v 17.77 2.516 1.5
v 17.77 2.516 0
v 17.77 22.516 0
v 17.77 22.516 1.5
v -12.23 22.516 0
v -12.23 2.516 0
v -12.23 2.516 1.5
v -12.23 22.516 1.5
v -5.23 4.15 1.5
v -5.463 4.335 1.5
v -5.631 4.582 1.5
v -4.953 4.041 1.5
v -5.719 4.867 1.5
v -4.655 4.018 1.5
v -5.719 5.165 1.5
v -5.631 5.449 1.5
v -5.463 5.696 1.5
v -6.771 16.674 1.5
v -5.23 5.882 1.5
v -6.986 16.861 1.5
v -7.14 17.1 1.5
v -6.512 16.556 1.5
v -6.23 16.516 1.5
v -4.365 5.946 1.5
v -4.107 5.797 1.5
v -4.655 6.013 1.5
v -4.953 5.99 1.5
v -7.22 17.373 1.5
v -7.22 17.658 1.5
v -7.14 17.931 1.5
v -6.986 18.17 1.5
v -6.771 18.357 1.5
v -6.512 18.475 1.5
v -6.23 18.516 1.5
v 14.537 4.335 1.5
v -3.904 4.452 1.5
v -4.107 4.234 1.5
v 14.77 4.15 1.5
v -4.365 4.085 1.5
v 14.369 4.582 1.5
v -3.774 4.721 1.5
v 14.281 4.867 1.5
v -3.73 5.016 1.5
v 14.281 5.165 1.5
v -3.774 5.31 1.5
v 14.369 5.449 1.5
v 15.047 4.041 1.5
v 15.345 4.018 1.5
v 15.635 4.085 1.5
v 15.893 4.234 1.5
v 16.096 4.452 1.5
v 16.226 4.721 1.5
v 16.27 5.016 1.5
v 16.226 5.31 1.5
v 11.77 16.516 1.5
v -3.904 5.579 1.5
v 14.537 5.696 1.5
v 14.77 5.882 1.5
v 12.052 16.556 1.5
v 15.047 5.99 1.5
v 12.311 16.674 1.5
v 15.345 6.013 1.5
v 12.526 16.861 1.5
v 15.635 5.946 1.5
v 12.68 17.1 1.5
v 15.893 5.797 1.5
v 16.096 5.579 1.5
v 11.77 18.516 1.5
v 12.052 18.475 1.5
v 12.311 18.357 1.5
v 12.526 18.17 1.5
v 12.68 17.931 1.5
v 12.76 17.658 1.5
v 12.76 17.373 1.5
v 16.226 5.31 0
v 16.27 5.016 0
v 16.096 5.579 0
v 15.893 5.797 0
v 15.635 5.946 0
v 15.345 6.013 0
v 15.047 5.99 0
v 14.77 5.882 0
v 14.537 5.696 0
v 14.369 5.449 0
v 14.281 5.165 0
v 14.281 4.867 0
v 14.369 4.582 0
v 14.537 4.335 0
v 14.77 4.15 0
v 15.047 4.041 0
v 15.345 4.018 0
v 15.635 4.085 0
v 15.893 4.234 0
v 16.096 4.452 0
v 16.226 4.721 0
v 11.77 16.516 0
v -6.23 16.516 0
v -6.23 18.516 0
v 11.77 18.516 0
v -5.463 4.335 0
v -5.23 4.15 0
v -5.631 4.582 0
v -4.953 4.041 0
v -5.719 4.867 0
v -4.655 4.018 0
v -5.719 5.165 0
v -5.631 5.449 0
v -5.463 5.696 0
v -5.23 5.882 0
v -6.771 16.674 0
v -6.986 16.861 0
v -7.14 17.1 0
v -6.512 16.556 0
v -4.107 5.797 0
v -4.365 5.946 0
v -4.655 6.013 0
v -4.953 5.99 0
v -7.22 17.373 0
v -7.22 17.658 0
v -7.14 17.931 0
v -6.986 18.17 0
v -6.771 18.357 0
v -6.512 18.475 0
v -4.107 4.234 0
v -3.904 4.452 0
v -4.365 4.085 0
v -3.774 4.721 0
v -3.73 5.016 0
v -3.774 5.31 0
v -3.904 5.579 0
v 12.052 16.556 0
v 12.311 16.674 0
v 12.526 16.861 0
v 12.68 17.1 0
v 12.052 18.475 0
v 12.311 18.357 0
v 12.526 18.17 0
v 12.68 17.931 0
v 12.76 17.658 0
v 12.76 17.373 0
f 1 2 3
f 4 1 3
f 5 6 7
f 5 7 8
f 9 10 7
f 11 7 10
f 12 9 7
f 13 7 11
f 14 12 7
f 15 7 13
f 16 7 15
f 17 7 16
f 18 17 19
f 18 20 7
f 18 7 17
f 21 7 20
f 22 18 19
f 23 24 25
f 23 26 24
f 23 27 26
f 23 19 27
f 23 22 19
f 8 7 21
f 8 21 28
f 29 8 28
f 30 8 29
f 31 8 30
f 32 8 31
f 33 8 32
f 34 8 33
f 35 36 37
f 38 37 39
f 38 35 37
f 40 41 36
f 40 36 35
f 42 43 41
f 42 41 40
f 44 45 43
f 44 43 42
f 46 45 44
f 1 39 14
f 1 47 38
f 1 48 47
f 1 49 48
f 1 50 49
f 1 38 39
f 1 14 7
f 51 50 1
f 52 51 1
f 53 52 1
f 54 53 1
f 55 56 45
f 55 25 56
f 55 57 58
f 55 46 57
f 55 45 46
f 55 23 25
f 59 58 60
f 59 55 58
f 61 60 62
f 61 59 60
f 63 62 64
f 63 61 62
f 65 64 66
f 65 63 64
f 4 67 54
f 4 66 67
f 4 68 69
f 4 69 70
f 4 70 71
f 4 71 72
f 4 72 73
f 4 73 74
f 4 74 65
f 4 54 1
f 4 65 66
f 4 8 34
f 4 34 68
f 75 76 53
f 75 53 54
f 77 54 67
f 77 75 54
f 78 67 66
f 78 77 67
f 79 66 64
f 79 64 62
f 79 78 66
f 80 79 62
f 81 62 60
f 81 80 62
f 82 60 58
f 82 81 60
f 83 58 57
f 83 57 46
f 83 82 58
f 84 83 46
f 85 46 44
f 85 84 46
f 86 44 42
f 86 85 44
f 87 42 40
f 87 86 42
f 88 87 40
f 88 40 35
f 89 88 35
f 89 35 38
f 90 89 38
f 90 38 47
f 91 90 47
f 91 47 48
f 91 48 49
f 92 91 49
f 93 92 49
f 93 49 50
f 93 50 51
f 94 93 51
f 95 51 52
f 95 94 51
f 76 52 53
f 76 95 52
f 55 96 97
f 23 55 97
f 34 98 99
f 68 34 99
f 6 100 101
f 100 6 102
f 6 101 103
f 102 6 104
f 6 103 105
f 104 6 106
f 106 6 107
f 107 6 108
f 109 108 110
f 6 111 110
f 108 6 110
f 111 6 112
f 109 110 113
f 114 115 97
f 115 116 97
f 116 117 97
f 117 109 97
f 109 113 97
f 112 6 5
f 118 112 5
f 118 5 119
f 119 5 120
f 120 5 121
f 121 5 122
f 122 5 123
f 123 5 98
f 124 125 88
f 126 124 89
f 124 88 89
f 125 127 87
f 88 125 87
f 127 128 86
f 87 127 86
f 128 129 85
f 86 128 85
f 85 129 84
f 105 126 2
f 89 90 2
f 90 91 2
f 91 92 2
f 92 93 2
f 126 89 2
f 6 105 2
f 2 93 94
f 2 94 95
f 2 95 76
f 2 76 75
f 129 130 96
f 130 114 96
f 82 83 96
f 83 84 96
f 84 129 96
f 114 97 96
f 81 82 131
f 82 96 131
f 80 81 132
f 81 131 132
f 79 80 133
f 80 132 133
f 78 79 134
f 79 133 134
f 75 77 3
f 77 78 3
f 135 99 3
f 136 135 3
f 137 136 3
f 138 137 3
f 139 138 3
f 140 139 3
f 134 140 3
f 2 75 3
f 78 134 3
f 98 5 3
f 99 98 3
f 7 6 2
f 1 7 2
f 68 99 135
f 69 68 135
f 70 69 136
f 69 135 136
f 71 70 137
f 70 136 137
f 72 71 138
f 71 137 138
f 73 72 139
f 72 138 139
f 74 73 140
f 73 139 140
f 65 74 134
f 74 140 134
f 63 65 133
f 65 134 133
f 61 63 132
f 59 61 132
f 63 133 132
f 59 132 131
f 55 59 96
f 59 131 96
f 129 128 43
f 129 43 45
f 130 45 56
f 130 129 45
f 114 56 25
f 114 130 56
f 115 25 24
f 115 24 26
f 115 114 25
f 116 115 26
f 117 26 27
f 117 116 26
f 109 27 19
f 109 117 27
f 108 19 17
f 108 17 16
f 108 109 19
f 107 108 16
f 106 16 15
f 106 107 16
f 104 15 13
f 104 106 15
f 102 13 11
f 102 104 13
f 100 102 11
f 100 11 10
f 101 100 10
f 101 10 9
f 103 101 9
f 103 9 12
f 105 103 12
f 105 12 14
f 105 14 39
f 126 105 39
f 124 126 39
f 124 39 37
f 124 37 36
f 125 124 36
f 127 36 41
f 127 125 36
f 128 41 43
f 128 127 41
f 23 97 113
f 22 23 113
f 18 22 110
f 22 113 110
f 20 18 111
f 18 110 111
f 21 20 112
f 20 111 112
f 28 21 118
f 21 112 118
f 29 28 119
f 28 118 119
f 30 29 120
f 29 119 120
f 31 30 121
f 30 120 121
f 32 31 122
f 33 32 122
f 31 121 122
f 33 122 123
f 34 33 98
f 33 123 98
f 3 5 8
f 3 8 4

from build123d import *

# Parameters (mm, degrees)
SKETCH4_W           = 30
SKETCH4_H           = 20
SKETCH4_R           = 1
BOSS_EXTRUDE2_DEPTH = 1.5


with BuildPart() as part:
    # Sketch4 → Boss-Extrude2 (new body)
    with BuildSketch(Plane.XY):
        with Locations((2.769964864, 12.5155541)):
            Rectangle(SKETCH4_W, SKETCH4_H)
        with Locations((-4.730035136, 5.0155541)):
            Circle(SKETCH4_R, mode=Mode.SUBTRACT)
        with Locations((15.269964864, 5.0155541)):
            Circle(SKETCH4_R, mode=Mode.SUBTRACT)
        with BuildLine():
            Line((-6.230035136, 18.5155541), (11.769964864, 18.5155541))
            ThreePointArc((11.769964864, 18.5155541), (12.769964864, 17.5155541), (11.769964864, 16.5155541))
            Line((11.769964864, 16.5155541), (-6.230035136, 16.5155541))
            ThreePointArc((-6.230035136, 16.5155541), (-7.230035136, 17.5155541), (-6.230035136, 18.5155541))
        make_face(mode=Mode.SUBTRACT)
    extrude(amount=BOSS_EXTRUDE2_DEPTH)


solid = part.part
